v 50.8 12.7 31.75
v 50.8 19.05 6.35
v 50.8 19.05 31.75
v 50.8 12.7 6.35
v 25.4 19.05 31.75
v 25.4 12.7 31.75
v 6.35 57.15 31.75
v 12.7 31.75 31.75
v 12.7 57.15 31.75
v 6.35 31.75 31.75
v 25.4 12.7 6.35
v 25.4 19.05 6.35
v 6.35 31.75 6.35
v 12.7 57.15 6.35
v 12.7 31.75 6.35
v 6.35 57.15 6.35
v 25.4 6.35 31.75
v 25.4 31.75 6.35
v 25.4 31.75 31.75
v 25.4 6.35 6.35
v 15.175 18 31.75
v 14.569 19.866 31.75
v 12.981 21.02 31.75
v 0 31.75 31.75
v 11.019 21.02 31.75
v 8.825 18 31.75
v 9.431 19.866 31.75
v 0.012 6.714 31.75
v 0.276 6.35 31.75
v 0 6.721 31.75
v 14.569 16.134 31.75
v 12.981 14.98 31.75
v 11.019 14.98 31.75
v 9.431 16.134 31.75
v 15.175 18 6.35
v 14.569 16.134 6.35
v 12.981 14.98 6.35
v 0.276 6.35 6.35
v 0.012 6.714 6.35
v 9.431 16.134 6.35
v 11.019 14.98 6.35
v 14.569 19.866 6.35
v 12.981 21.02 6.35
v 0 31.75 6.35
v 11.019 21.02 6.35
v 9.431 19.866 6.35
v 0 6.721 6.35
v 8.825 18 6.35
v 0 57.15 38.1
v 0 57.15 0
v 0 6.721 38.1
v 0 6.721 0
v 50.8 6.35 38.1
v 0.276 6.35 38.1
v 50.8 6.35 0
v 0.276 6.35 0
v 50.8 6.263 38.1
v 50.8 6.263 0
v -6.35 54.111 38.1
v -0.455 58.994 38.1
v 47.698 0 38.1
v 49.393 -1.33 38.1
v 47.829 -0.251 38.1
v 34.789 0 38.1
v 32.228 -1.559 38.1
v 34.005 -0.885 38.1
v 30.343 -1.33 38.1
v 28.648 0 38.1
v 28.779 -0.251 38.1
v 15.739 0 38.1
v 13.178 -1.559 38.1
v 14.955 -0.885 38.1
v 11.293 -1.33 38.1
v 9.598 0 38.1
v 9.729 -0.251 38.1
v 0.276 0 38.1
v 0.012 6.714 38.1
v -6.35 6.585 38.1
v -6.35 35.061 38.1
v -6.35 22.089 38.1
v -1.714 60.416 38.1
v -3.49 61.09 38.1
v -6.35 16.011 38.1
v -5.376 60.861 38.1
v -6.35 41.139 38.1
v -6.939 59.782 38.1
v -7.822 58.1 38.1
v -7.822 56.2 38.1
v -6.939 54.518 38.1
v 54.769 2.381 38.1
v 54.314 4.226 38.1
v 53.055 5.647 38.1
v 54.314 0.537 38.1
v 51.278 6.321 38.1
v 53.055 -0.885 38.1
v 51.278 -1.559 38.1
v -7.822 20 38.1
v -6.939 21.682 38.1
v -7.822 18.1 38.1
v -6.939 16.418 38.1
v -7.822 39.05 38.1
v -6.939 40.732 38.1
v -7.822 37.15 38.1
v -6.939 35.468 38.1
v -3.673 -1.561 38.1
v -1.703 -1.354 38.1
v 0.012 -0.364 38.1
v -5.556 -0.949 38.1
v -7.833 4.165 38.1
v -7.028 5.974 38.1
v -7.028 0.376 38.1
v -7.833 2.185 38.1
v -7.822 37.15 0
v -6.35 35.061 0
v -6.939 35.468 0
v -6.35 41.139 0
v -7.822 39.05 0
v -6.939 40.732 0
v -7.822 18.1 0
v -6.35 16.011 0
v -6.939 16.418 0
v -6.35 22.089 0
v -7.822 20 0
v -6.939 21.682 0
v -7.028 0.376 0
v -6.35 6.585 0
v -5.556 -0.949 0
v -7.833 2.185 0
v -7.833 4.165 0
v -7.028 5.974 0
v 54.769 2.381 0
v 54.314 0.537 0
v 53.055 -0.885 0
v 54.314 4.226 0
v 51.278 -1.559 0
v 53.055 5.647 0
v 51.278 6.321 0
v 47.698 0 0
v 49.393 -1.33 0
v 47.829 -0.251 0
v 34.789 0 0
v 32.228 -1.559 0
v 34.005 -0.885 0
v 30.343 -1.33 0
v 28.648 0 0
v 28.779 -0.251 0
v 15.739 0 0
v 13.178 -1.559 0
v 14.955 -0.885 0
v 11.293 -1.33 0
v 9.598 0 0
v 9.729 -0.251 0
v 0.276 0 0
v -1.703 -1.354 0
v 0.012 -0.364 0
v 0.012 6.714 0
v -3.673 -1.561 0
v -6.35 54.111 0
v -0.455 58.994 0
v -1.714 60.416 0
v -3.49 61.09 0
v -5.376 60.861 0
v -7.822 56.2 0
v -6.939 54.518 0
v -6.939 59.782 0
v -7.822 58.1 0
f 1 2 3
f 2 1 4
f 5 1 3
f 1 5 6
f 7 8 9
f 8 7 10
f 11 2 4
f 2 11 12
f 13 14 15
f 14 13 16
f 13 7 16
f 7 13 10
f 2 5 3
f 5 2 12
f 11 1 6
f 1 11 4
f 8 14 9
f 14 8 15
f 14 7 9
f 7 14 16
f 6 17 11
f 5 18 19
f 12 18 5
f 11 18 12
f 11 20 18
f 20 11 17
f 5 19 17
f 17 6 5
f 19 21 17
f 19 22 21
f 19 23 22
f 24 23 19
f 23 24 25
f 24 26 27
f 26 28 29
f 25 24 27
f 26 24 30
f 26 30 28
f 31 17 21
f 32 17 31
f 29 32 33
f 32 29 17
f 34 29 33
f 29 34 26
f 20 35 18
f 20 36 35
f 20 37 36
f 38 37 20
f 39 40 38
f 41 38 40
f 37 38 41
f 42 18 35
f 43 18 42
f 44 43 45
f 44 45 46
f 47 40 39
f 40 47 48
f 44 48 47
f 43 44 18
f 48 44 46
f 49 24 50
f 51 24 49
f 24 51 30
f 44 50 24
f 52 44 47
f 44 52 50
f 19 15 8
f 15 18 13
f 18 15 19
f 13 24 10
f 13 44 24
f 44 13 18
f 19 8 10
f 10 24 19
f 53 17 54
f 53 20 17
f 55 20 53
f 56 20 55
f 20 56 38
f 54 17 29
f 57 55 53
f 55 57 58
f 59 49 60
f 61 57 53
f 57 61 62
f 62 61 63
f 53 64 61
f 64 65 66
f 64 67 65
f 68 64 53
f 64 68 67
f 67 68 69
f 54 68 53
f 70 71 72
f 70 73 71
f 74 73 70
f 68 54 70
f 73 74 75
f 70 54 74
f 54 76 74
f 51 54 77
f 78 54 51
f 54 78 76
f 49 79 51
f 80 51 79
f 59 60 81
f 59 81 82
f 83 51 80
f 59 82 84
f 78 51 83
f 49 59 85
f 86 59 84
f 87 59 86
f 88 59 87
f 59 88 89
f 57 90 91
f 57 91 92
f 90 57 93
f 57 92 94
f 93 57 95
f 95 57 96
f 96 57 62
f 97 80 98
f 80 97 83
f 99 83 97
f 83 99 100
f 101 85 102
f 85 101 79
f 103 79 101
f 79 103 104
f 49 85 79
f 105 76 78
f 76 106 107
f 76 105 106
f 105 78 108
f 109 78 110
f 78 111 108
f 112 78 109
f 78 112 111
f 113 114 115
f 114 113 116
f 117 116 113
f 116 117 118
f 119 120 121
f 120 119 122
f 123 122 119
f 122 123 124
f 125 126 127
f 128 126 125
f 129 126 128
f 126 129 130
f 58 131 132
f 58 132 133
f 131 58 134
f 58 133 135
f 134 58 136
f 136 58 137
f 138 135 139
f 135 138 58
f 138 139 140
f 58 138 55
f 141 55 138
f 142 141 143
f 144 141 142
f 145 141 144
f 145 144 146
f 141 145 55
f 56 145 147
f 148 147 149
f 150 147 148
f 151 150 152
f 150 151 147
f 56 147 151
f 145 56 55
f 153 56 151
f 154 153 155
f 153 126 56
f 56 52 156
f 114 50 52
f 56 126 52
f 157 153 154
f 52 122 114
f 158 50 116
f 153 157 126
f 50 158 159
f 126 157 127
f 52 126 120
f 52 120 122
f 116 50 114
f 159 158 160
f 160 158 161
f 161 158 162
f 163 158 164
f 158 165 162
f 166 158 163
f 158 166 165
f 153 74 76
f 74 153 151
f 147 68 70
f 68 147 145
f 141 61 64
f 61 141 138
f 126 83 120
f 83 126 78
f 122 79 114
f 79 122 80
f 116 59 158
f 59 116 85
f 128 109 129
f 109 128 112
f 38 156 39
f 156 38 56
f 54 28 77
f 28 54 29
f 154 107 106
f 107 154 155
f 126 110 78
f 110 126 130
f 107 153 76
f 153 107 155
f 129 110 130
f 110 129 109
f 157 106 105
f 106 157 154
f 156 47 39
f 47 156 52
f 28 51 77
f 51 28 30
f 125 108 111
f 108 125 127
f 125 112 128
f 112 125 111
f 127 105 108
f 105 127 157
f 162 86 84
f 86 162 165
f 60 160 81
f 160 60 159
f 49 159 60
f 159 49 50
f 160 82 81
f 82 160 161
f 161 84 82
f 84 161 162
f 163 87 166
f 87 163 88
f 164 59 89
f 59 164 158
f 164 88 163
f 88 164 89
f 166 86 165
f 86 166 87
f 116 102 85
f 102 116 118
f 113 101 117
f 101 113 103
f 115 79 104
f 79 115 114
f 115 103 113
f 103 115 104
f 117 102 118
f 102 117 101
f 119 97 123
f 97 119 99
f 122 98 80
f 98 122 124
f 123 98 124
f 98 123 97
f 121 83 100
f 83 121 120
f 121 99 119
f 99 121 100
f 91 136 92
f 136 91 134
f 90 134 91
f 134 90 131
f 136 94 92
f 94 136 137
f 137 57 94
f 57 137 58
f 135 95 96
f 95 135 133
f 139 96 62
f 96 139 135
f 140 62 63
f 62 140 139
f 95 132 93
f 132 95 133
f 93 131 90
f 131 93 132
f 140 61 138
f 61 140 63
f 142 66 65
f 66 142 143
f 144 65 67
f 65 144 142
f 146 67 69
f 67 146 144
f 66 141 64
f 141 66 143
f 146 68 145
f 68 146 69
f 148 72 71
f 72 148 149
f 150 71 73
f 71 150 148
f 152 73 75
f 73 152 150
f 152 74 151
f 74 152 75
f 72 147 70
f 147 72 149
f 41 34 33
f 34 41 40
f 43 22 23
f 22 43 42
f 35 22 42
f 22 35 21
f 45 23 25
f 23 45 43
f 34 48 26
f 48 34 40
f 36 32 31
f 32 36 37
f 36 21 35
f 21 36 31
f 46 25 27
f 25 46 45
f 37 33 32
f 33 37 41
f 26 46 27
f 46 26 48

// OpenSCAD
/**
 * joints.scad is part of Paper Laptop project.
 * This file contains various models for joining two or
 * more pieces of flat materials together.
 *
 * @author R. S. Doiel, <rsdoiel@gmail.com>
 * copyright (c) 2016 all rights reserved
 * Released under a BSD 2-clause license
 */

// Formboard firm enough to make a case with is about
// 1/4th inch (6.35mm) thick. Usually sold in single sheets
// of about 20"x30".

//
// Basic models are for parts without any holes for fasteners.
//

/*
 * CornerBasic() - corner joint without fastener hole
 */
module CornerBasic() {
    u = 3.175; // Unit is 3.175mm or 1/8th inch:w
    t = u*2; // Thickness of the 1/4th" Foamboard

    // Inner block, width, depth, height
    translate([0, t, t]) {
            color([1,0,0]) cube([25.4, 25.4, 25.4]); 
    }
    // Outer shell
    color([0,1,0]) cube([50.8,t,25.4+(2*t)]);
    translate([-t,t,0]) {
        color([0,1,0]) cube([t,50.8,25.4+(2*t)]);
    }
    // Outer corners
    translate([u*-1,u,0]) {
        color([0,1,0]) cylinder(h=25.4+(2*t),r=1.5*u,center=false);
    }

    // Outer bumps
    translate([u*-1.25,u*18,0]) {
        color([0,1,0]) cylinder(h=25.4+(2*t),r=1.25*u,center=false);
    }
    translate([u*-1.25,u*12,0]) {
        color([0,1,0]) cylinder(h=25.4+(2*t),r=1.25*u,center=false);
    }
    translate([u*-1.25,u*6,0]) {
        color([0,1,0]) cylinder(h=25.4+(2*t),r=1.25*u,center=false);
    }

    translate([u*16,u*0.75,0]) {
        color([0,1,0]) cylinder(h=25.4+(2*t),r=1.25*u,center=false);
    }
    translate([u*10,u*0.75,0]) {
        color([0,1,0]) cylinder(h=25.4+(2*t),r=1.25*u,center=false);
    }
    translate([u*4,u*0.75,0]) {
        color([0,1,0]) cylinder(h=25.4+(2*t),r=1.25*u,center=false);
    }
    
    // Inner shell
    translate([t,2*t,t]) {
        color([0,1,0]) cube([50.8-t,t,25.4]);
        color([0,1,0]) cube([t,50.8-t,25.4]);
    }
}

//
// Corner() basic corner joint plus hole for fastener
//
module Corner() {
    difference() {
        u = 3.175;
        CornerBasic();
        // Add a hole for screw
        translate([12,18,0]) {
            color([0,0,1]) cylinder(h=25.4+(4*u),r=u,center=false);
        }
    }
}

Corner();
